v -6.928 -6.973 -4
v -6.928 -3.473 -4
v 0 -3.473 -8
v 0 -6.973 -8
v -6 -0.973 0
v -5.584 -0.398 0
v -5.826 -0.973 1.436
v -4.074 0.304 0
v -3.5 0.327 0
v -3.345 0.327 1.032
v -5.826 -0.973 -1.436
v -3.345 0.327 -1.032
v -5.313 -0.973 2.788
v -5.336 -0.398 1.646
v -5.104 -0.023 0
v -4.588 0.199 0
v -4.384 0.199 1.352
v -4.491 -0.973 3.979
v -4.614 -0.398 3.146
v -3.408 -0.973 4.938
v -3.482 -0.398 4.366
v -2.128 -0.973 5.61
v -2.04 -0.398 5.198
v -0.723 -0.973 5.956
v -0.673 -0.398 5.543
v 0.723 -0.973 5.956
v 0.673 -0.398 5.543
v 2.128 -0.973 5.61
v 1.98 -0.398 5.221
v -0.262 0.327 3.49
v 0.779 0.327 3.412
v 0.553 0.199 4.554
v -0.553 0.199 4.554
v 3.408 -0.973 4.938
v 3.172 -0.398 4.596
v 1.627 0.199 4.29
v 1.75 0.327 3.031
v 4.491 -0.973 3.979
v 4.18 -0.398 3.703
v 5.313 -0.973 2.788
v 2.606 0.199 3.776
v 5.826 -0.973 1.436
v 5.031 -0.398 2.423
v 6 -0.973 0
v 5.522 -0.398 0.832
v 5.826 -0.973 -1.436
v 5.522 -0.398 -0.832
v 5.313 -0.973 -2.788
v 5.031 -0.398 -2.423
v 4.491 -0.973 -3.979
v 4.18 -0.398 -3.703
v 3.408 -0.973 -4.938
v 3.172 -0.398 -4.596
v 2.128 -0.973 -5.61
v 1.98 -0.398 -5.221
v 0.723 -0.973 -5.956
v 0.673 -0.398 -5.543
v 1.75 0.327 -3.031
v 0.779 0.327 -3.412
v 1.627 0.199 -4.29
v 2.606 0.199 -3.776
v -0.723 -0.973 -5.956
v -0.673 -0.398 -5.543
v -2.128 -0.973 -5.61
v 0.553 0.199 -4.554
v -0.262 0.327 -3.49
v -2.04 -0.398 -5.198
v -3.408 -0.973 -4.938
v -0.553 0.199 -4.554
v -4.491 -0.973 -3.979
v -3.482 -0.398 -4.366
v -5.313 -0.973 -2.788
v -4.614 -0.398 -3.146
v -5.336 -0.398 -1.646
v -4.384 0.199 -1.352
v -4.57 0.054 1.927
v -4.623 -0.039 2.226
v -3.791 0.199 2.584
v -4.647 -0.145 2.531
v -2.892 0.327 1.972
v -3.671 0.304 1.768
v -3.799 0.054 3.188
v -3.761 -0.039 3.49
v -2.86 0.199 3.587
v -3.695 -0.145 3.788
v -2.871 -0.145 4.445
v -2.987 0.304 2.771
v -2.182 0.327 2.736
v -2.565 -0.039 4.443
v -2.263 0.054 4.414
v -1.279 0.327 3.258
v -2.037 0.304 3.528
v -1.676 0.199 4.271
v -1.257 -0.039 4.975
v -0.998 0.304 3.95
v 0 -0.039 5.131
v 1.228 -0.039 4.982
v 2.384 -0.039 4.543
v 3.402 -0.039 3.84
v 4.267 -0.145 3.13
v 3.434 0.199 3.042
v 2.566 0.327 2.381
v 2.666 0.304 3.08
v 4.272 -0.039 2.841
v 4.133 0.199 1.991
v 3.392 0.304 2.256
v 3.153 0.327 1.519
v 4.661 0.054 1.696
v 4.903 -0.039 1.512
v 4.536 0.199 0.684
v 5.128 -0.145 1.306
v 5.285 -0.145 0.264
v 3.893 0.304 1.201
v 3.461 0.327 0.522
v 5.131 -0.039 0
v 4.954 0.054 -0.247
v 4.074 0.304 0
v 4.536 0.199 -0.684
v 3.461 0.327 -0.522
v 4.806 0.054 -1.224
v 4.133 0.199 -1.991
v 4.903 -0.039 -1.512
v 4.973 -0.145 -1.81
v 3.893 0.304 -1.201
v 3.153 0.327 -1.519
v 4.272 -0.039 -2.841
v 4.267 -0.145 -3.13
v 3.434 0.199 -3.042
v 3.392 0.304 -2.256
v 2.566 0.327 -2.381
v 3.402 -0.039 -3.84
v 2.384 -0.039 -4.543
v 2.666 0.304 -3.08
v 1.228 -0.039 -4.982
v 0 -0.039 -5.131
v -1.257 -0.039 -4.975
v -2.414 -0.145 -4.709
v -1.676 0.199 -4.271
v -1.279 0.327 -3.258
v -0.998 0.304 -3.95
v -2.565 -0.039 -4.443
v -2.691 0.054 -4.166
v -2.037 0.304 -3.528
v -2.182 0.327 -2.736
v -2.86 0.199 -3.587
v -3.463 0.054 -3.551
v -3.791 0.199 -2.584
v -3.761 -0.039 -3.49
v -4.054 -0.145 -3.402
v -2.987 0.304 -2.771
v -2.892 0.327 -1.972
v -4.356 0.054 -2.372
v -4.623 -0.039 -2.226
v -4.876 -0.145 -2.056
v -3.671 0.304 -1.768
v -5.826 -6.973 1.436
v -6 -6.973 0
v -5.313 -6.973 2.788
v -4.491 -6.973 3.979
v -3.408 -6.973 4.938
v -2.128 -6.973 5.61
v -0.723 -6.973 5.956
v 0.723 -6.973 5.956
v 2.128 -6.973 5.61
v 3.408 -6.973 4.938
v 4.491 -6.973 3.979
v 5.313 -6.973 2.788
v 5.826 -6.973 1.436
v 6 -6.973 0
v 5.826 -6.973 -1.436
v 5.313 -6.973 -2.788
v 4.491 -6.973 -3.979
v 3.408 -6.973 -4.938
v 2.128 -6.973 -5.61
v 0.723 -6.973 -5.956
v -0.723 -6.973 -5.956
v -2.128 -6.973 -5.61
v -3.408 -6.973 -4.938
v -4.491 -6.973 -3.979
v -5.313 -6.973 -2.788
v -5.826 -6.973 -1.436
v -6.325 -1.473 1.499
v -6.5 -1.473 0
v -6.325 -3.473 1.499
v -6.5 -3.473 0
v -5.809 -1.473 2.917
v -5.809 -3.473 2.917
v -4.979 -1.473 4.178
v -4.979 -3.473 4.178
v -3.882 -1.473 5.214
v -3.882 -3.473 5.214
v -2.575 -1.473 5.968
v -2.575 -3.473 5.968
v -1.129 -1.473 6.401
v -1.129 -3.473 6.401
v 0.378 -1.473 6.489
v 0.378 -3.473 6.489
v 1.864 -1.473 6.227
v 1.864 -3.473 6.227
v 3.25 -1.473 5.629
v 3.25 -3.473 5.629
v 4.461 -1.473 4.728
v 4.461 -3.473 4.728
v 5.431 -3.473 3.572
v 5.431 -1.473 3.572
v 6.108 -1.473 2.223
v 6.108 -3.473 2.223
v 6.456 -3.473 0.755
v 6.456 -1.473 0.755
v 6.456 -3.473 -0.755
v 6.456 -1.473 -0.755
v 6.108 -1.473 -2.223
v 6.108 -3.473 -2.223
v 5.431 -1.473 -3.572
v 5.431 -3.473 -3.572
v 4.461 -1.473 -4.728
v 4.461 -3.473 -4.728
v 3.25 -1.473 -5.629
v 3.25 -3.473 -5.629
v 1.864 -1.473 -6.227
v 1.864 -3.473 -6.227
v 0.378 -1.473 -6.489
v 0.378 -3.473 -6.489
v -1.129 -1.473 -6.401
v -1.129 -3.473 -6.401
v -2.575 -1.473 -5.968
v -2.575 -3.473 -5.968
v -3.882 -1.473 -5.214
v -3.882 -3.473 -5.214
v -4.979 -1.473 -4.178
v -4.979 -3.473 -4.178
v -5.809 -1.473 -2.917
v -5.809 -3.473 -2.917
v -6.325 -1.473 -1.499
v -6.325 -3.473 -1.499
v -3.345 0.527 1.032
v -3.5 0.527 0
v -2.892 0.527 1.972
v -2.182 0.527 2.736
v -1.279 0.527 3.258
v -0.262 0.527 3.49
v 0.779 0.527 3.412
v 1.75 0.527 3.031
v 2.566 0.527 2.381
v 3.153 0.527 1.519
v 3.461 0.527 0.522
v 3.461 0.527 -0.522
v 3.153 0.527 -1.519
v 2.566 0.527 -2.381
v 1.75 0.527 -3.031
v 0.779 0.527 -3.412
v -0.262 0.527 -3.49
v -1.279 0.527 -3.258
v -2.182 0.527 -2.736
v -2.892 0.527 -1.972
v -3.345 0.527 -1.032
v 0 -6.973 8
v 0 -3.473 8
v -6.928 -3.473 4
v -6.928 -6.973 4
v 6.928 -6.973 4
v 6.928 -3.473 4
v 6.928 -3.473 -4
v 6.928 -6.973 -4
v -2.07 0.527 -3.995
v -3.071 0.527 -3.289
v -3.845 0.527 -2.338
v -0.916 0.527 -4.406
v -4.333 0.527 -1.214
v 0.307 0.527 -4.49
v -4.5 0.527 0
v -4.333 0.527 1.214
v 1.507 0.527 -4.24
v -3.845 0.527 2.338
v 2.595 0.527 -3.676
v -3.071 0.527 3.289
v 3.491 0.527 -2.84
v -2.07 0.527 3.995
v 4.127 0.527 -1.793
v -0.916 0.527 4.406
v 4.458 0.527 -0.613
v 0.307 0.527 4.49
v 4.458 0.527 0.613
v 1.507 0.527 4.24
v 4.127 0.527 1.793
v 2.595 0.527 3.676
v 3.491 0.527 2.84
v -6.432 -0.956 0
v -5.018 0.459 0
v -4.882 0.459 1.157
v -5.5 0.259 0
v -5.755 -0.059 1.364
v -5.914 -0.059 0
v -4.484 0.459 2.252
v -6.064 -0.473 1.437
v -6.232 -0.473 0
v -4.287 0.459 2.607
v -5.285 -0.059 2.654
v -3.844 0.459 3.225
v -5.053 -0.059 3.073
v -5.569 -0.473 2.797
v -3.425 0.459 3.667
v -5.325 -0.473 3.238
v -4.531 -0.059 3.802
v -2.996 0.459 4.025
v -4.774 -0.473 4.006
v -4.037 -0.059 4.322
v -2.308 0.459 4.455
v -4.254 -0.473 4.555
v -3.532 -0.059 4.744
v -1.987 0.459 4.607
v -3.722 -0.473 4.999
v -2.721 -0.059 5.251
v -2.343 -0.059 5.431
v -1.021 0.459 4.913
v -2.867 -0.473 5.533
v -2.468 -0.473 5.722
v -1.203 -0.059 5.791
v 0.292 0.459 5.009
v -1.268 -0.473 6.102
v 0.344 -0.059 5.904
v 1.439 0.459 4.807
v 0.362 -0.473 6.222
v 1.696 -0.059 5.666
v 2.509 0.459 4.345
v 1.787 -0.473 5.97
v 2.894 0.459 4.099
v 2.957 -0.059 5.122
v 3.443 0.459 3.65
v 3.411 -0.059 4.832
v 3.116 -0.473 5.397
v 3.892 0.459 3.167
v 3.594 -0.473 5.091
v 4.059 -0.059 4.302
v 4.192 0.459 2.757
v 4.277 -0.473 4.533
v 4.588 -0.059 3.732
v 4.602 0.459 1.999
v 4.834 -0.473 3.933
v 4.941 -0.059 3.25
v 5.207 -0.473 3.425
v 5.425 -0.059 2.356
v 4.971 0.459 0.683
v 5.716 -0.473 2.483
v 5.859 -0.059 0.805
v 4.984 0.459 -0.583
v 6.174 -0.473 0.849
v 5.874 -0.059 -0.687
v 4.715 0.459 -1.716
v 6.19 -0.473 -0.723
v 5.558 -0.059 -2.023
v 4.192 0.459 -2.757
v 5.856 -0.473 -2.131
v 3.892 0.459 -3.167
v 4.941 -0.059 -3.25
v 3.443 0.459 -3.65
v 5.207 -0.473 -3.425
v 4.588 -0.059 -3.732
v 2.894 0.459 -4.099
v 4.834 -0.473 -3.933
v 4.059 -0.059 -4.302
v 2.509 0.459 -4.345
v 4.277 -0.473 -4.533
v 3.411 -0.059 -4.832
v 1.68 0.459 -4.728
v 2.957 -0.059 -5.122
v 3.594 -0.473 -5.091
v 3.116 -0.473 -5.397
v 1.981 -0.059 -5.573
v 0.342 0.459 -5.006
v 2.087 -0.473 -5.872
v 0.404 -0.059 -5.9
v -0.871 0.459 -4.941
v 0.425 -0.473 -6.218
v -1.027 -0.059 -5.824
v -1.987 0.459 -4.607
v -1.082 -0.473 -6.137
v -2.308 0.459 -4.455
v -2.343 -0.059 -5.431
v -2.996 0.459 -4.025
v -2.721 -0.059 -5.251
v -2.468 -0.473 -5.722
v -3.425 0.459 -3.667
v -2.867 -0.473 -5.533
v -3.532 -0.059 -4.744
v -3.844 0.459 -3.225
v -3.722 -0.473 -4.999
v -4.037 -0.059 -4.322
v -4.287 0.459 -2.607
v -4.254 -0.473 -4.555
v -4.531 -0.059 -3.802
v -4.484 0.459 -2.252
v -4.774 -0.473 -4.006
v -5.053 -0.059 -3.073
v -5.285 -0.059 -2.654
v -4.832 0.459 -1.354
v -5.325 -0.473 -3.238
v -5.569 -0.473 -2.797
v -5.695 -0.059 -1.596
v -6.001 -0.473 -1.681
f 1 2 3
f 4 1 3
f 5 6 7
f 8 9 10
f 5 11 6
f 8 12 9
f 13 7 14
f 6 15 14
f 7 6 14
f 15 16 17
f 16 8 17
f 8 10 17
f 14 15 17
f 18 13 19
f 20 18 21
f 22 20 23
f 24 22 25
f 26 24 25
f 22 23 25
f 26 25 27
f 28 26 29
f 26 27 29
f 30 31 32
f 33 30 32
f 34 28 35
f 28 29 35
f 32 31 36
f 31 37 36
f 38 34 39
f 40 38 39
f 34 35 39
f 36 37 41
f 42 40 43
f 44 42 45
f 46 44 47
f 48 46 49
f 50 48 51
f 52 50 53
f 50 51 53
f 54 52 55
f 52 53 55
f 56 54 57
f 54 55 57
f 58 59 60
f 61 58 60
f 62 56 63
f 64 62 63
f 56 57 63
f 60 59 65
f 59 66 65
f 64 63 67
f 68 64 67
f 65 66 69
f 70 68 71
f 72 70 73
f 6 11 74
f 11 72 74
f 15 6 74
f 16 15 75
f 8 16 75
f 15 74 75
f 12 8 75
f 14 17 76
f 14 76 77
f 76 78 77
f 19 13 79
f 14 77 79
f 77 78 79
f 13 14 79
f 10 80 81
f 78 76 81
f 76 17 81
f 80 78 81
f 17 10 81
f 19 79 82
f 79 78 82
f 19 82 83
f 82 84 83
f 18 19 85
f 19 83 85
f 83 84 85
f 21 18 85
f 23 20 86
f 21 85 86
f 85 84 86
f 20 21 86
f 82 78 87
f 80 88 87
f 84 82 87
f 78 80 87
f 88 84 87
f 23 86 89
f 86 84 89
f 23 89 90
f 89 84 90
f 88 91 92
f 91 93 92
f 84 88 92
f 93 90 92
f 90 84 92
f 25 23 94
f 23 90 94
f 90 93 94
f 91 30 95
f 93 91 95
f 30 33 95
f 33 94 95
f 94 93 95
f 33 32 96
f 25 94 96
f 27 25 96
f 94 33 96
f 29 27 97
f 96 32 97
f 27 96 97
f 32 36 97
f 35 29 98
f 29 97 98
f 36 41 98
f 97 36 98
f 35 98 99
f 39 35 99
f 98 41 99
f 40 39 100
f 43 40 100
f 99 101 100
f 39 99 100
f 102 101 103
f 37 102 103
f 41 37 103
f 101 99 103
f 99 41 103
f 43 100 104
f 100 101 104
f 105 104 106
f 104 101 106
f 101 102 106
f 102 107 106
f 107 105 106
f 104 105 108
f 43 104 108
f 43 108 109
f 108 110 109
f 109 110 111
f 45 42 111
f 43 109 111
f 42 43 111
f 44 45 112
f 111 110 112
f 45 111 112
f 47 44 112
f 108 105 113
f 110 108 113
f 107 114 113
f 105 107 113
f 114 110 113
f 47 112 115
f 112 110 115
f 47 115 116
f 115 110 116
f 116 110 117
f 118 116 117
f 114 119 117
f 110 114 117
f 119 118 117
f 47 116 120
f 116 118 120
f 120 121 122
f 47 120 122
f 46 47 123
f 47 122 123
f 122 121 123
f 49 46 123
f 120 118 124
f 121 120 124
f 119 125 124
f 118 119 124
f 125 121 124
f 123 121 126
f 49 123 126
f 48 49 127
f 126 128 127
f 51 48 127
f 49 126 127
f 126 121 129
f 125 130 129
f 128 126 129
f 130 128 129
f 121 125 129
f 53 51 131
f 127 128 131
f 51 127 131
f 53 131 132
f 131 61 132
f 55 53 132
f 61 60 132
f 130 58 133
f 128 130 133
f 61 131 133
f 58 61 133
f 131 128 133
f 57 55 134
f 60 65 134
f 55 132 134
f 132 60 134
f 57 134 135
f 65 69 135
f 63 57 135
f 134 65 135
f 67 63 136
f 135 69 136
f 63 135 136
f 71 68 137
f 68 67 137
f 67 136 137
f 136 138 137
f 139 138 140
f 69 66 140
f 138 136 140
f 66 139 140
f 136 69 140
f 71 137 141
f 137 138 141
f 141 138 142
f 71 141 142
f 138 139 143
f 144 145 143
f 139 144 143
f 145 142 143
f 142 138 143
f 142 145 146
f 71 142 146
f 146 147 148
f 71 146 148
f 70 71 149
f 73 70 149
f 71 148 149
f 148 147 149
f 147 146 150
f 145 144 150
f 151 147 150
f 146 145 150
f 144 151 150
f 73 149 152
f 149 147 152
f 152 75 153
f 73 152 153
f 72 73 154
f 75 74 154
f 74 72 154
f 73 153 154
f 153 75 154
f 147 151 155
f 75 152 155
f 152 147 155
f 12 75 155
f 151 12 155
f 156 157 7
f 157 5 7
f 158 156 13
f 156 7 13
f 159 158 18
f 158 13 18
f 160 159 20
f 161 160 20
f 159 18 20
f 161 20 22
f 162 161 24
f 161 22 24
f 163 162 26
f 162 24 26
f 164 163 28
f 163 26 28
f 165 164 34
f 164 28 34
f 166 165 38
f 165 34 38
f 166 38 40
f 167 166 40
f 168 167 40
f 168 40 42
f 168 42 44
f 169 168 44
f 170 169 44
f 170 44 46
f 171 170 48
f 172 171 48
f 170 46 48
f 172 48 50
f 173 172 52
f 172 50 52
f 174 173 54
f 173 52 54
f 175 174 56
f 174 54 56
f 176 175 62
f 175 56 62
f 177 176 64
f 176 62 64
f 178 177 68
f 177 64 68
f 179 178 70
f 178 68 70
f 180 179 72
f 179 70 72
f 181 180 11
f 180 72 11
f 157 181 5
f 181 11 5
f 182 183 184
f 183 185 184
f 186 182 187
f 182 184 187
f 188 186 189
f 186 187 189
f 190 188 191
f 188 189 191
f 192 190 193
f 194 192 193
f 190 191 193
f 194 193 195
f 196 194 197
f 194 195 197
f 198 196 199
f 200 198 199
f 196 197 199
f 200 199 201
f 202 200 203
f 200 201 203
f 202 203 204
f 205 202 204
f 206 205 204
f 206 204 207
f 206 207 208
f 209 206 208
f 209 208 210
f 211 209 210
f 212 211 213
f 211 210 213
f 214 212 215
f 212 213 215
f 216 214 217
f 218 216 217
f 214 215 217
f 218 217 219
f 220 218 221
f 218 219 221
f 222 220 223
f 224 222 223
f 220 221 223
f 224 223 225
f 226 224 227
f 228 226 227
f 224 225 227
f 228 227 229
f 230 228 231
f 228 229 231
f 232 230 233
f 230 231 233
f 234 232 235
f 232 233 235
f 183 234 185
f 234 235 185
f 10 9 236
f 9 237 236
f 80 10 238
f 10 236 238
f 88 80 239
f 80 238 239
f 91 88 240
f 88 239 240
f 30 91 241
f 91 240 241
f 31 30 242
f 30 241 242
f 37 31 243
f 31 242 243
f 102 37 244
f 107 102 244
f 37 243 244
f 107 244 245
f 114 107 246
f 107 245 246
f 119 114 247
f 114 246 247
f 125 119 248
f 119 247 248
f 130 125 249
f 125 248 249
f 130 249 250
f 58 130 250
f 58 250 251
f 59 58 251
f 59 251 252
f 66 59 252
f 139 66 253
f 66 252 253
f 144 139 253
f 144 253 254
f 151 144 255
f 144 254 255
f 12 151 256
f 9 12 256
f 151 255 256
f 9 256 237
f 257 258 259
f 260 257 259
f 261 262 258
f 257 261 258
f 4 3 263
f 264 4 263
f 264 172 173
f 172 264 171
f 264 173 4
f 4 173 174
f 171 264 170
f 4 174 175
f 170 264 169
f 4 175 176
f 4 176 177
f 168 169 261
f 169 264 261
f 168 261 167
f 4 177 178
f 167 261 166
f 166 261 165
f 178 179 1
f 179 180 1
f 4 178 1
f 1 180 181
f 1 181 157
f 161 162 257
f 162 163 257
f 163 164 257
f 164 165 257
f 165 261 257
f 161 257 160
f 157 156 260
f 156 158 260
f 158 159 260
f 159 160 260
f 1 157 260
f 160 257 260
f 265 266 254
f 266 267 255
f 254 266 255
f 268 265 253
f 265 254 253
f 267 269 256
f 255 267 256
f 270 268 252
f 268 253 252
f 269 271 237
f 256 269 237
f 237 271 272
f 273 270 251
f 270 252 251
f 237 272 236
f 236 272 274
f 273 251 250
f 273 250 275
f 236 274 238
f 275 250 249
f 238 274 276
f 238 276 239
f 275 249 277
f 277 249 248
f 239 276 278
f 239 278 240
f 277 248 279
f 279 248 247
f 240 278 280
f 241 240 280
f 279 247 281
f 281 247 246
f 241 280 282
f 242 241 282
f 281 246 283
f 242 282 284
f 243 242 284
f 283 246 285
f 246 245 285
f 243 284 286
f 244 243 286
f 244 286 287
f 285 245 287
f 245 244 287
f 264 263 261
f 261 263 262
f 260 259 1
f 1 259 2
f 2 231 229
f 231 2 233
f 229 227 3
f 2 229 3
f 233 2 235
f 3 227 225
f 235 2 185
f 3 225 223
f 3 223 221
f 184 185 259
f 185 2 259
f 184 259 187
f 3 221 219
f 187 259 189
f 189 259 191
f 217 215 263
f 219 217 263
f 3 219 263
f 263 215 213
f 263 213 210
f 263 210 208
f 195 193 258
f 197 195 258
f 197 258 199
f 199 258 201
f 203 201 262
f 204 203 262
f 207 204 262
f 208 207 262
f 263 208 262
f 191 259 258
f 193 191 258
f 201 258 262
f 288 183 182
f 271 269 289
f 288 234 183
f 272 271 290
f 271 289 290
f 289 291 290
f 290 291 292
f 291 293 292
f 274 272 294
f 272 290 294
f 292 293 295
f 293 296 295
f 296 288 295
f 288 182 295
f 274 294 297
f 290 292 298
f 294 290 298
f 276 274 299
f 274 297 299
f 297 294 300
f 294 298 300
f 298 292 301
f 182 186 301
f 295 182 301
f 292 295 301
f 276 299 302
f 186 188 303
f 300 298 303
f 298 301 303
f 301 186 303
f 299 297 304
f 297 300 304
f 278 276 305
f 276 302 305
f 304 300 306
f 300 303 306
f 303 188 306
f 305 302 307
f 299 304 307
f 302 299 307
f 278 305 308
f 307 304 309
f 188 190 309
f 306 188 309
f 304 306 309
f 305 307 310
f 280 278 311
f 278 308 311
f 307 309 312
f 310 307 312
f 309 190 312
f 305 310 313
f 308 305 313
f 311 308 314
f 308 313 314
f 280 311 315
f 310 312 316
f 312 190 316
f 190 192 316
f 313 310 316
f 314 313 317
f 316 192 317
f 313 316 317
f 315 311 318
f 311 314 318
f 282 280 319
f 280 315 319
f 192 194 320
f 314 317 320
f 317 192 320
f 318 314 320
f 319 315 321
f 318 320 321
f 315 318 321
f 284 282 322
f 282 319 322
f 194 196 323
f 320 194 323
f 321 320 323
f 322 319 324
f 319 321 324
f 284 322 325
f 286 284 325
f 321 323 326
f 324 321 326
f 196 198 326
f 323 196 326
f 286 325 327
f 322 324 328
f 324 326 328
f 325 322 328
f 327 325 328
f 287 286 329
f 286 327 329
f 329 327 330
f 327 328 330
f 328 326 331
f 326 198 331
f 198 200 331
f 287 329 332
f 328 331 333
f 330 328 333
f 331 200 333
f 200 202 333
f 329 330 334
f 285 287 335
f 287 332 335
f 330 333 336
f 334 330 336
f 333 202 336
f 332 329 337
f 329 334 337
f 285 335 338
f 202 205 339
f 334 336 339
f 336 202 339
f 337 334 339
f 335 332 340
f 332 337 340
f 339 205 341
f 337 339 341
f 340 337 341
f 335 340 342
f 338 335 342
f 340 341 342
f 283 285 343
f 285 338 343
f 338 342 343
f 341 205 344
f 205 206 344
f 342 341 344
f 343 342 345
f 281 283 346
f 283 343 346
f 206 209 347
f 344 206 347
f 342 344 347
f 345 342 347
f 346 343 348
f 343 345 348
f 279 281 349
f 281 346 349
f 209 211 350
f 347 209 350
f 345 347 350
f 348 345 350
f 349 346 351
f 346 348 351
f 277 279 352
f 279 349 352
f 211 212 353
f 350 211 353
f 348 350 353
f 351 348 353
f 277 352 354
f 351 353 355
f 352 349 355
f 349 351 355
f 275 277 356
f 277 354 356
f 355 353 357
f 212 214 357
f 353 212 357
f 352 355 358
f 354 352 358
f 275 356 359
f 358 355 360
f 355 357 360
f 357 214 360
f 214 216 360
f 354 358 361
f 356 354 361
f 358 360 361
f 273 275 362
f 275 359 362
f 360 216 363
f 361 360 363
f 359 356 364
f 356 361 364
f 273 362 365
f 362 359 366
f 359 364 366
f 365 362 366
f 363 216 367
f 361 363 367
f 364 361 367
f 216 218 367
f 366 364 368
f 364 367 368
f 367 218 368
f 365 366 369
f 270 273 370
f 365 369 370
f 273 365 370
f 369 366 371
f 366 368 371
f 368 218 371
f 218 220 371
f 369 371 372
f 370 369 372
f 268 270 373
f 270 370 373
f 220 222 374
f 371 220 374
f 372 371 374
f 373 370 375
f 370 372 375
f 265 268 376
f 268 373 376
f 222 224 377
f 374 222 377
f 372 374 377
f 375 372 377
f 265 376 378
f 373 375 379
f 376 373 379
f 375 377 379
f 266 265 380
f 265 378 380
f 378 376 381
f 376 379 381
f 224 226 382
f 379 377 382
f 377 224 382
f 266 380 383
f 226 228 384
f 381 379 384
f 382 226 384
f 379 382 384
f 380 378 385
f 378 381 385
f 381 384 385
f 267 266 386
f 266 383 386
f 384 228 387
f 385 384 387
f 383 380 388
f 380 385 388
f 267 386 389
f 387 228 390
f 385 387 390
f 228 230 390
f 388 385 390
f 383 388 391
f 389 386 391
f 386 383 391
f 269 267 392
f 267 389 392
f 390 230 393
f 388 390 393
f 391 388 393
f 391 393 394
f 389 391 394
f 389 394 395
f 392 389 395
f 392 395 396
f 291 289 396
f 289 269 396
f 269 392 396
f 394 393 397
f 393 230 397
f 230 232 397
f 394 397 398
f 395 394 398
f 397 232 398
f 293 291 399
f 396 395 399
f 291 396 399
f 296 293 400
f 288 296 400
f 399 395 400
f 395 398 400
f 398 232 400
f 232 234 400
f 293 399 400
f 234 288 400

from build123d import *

# Parameters (mm, degrees)
SKETCH_2_R          = 11.601145783
CUT_EXTRUDE_1_DEPTH = 10


with BuildPart() as part:
    # Эскиз1 → Повернуть1 (revolve)
    with BuildSketch(Plane.XY):
        with BuildLine():
            Line((-8, -6.973192061), (-6, -6.973192061))
            Line((-6, -6.973192061), (-6, -0.973192061))
            add(Edge.make_bspline(
                [(-6, -0.973192061), (-5.270413842, 0.380623503), (-3.5, 0.326807939)],
                knots=[0, 0, 0, 1, 1, 1], degree=2))
            Line((-3.5, 0.326807939), (-3.5, 0.526807939))
            Line((-3.5, 0.526807939), (-4.5, 0.526807939))
            ThreePointArc((-4.5, 0.526807939), (-5.914213562, -0.058978499), (-6.5, -1.473192061))
            Line((-6.5, -1.473192061), (-6.5, -3.473192061))
            Line((-6.5, -3.473192061), (-8, -3.473192061))
            Line((-8, -3.473192061), (-8, -6.973192061))
        make_face()
    revolve(axis=Axis((0, -7.792035126, 0), (0, 1, 0)))

    # Эскиз2 → Вырез-Вытянуть1 (cut)
    with BuildSketch(Plane(origin=(0, -3.473192061, 0), x_dir=(1, 0, 0), z_dir=(0, 1, 0))):
        Circle(SKETCH_2_R)
        Polygon((0, 8), (6.92820323, 4), (6.92820323, -4), (0, -8), (-6.92820323, -4), (-6.92820323, 4), align=None, mode=Mode.SUBTRACT)
    extrude(amount=-CUT_EXTRUDE_1_DEPTH, mode=Mode.SUBTRACT)


solid = part.part
